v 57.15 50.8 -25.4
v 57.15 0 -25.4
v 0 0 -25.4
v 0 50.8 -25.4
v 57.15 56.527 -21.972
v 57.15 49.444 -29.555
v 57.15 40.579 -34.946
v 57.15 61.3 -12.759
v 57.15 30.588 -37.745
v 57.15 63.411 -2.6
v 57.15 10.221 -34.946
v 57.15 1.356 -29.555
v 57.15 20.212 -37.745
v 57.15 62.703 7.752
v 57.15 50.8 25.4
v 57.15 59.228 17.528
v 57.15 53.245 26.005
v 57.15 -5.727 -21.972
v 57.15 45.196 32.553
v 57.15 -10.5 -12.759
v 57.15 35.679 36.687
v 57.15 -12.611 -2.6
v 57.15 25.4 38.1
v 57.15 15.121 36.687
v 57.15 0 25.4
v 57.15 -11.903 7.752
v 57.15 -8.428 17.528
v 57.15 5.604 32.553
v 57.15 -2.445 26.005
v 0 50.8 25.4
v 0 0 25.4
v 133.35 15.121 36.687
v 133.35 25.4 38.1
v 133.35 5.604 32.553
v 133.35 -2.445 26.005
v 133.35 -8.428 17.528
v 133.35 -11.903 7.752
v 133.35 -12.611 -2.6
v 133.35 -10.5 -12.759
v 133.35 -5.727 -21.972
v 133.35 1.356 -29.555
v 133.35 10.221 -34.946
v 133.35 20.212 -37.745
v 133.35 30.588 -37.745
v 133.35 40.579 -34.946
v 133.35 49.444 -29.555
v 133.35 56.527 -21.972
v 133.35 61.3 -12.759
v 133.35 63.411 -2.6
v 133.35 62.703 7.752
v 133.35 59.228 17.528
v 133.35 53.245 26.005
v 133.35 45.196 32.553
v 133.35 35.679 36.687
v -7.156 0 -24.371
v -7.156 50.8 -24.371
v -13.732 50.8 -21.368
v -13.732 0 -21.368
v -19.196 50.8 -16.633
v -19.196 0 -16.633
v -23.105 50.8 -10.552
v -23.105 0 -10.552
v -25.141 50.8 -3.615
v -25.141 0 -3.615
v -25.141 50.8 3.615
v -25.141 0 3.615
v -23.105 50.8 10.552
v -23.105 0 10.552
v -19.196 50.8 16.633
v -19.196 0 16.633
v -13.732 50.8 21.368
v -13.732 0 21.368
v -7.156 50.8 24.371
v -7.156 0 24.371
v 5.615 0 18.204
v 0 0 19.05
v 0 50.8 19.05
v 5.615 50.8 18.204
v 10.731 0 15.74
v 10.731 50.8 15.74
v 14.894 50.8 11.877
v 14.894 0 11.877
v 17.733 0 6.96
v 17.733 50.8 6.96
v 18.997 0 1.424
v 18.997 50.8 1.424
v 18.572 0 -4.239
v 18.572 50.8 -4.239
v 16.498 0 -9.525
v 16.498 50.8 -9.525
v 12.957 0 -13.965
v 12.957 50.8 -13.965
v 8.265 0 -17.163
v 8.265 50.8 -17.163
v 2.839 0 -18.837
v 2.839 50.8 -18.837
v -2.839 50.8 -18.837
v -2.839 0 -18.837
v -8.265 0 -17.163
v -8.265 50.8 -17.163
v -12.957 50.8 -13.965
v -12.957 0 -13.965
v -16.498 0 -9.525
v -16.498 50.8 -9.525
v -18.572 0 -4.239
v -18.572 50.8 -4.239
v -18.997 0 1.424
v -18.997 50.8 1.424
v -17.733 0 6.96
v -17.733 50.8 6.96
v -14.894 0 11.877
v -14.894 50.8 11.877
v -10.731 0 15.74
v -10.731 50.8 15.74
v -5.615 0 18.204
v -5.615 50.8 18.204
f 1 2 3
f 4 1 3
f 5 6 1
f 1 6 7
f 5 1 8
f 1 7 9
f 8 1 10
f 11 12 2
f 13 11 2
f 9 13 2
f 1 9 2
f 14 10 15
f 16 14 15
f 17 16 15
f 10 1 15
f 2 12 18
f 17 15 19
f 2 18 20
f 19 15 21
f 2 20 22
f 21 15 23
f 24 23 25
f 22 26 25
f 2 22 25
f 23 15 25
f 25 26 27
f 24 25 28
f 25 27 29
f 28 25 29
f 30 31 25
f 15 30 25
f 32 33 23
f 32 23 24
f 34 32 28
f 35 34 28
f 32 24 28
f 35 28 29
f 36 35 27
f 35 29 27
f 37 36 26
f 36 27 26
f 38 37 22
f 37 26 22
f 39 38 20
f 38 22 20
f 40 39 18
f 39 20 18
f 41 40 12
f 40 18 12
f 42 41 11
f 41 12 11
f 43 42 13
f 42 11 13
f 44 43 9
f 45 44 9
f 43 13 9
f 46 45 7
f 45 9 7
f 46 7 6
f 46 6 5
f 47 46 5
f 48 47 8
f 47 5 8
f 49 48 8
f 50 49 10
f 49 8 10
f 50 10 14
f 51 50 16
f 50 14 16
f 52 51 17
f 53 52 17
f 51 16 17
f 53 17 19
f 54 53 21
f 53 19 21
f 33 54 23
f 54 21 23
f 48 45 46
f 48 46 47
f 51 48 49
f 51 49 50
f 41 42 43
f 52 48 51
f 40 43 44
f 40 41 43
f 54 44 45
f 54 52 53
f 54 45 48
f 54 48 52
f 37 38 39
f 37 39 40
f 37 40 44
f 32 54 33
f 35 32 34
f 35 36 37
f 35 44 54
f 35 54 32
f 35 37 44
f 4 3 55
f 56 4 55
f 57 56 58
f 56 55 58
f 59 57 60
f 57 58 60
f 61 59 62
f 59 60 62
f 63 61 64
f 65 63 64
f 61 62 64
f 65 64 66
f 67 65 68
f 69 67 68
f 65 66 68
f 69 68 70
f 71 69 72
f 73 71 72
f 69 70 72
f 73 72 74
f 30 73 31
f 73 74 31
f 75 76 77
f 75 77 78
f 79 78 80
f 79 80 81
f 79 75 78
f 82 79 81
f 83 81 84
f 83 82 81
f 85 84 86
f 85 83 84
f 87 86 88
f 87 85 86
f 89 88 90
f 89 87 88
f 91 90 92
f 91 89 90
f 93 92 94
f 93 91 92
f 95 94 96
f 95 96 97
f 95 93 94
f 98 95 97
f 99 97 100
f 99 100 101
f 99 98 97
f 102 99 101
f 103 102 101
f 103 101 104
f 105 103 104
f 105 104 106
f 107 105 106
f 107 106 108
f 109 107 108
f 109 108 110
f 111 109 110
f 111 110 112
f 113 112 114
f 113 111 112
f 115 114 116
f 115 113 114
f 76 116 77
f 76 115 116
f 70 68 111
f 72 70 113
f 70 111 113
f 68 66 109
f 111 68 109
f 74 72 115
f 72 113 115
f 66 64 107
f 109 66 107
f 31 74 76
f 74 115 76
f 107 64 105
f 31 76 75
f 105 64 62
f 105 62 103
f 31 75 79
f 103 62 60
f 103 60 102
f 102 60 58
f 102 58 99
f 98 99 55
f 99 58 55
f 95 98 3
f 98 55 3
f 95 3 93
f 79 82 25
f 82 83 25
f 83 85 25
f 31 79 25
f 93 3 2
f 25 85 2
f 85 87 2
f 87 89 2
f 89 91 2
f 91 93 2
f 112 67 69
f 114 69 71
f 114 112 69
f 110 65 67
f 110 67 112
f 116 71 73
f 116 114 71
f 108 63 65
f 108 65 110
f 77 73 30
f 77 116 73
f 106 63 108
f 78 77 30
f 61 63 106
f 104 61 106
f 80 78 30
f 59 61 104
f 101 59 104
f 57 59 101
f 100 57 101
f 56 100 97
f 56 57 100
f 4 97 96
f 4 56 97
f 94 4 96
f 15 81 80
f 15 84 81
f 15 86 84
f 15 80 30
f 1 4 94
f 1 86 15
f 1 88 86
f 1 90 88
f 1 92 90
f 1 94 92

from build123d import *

# Parameters (mm, degrees)
SKETCH1_R           = 25.4
SKETCH1_R_2         = 19.05
BOSS_EXTRUDE1_DEPTH = 50.8
SKETCH2_R           = 38.1
BOSS_EXTRUDE2_DEPTH = 76.2


with BuildPart() as part:
    # Sketch1 → Boss-Extrude1 (new body)
    # profile 1 of 2: a face of its own
    with BuildSketch(Plane(origin=(0, 0, 0), x_dir=(1, 0, 0), z_dir=(0, 1, 0))):
        with BuildLine():
            ThreePointArc((25.4, 0), (17.960512242, -17.960512242), (0, -25.4))
            Line((0, -25.4), (57.15, -25.4))
            Line((57.15, -25.4), (57.15, 25.4))
            Line((57.15, 25.4), (0, 25.4))
            ThreePointArc((0, 25.4), (17.960512242, 17.960512242), (25.4, 0))
        make_face()
    # profile 2 of 2: a face of its own
    with BuildSketch(Plane(origin=(0, 0, 0), x_dir=(1, 0, 0), z_dir=(0, 1, 0))):
        Circle(SKETCH1_R)
        with Locations(Location((0, 0, 0), (0, 0, 270))):
            Circle(SKETCH1_R_2, mode=Mode.SUBTRACT)
    extrude(amount=BOSS_EXTRUDE1_DEPTH)

    # Sketch2 → Boss-Extrude2 (add)
    with BuildSketch(Plane(origin=(57.15, 0, 0), x_dir=(0, 0, -1), z_dir=(1, 0, 0))):
        with Locations(Location((0, 25.4, 0), (0, 0, 180))):
            Circle(SKETCH2_R)
    extrude(amount=BOSS_EXTRUDE2_DEPTH)


solid = part.part
